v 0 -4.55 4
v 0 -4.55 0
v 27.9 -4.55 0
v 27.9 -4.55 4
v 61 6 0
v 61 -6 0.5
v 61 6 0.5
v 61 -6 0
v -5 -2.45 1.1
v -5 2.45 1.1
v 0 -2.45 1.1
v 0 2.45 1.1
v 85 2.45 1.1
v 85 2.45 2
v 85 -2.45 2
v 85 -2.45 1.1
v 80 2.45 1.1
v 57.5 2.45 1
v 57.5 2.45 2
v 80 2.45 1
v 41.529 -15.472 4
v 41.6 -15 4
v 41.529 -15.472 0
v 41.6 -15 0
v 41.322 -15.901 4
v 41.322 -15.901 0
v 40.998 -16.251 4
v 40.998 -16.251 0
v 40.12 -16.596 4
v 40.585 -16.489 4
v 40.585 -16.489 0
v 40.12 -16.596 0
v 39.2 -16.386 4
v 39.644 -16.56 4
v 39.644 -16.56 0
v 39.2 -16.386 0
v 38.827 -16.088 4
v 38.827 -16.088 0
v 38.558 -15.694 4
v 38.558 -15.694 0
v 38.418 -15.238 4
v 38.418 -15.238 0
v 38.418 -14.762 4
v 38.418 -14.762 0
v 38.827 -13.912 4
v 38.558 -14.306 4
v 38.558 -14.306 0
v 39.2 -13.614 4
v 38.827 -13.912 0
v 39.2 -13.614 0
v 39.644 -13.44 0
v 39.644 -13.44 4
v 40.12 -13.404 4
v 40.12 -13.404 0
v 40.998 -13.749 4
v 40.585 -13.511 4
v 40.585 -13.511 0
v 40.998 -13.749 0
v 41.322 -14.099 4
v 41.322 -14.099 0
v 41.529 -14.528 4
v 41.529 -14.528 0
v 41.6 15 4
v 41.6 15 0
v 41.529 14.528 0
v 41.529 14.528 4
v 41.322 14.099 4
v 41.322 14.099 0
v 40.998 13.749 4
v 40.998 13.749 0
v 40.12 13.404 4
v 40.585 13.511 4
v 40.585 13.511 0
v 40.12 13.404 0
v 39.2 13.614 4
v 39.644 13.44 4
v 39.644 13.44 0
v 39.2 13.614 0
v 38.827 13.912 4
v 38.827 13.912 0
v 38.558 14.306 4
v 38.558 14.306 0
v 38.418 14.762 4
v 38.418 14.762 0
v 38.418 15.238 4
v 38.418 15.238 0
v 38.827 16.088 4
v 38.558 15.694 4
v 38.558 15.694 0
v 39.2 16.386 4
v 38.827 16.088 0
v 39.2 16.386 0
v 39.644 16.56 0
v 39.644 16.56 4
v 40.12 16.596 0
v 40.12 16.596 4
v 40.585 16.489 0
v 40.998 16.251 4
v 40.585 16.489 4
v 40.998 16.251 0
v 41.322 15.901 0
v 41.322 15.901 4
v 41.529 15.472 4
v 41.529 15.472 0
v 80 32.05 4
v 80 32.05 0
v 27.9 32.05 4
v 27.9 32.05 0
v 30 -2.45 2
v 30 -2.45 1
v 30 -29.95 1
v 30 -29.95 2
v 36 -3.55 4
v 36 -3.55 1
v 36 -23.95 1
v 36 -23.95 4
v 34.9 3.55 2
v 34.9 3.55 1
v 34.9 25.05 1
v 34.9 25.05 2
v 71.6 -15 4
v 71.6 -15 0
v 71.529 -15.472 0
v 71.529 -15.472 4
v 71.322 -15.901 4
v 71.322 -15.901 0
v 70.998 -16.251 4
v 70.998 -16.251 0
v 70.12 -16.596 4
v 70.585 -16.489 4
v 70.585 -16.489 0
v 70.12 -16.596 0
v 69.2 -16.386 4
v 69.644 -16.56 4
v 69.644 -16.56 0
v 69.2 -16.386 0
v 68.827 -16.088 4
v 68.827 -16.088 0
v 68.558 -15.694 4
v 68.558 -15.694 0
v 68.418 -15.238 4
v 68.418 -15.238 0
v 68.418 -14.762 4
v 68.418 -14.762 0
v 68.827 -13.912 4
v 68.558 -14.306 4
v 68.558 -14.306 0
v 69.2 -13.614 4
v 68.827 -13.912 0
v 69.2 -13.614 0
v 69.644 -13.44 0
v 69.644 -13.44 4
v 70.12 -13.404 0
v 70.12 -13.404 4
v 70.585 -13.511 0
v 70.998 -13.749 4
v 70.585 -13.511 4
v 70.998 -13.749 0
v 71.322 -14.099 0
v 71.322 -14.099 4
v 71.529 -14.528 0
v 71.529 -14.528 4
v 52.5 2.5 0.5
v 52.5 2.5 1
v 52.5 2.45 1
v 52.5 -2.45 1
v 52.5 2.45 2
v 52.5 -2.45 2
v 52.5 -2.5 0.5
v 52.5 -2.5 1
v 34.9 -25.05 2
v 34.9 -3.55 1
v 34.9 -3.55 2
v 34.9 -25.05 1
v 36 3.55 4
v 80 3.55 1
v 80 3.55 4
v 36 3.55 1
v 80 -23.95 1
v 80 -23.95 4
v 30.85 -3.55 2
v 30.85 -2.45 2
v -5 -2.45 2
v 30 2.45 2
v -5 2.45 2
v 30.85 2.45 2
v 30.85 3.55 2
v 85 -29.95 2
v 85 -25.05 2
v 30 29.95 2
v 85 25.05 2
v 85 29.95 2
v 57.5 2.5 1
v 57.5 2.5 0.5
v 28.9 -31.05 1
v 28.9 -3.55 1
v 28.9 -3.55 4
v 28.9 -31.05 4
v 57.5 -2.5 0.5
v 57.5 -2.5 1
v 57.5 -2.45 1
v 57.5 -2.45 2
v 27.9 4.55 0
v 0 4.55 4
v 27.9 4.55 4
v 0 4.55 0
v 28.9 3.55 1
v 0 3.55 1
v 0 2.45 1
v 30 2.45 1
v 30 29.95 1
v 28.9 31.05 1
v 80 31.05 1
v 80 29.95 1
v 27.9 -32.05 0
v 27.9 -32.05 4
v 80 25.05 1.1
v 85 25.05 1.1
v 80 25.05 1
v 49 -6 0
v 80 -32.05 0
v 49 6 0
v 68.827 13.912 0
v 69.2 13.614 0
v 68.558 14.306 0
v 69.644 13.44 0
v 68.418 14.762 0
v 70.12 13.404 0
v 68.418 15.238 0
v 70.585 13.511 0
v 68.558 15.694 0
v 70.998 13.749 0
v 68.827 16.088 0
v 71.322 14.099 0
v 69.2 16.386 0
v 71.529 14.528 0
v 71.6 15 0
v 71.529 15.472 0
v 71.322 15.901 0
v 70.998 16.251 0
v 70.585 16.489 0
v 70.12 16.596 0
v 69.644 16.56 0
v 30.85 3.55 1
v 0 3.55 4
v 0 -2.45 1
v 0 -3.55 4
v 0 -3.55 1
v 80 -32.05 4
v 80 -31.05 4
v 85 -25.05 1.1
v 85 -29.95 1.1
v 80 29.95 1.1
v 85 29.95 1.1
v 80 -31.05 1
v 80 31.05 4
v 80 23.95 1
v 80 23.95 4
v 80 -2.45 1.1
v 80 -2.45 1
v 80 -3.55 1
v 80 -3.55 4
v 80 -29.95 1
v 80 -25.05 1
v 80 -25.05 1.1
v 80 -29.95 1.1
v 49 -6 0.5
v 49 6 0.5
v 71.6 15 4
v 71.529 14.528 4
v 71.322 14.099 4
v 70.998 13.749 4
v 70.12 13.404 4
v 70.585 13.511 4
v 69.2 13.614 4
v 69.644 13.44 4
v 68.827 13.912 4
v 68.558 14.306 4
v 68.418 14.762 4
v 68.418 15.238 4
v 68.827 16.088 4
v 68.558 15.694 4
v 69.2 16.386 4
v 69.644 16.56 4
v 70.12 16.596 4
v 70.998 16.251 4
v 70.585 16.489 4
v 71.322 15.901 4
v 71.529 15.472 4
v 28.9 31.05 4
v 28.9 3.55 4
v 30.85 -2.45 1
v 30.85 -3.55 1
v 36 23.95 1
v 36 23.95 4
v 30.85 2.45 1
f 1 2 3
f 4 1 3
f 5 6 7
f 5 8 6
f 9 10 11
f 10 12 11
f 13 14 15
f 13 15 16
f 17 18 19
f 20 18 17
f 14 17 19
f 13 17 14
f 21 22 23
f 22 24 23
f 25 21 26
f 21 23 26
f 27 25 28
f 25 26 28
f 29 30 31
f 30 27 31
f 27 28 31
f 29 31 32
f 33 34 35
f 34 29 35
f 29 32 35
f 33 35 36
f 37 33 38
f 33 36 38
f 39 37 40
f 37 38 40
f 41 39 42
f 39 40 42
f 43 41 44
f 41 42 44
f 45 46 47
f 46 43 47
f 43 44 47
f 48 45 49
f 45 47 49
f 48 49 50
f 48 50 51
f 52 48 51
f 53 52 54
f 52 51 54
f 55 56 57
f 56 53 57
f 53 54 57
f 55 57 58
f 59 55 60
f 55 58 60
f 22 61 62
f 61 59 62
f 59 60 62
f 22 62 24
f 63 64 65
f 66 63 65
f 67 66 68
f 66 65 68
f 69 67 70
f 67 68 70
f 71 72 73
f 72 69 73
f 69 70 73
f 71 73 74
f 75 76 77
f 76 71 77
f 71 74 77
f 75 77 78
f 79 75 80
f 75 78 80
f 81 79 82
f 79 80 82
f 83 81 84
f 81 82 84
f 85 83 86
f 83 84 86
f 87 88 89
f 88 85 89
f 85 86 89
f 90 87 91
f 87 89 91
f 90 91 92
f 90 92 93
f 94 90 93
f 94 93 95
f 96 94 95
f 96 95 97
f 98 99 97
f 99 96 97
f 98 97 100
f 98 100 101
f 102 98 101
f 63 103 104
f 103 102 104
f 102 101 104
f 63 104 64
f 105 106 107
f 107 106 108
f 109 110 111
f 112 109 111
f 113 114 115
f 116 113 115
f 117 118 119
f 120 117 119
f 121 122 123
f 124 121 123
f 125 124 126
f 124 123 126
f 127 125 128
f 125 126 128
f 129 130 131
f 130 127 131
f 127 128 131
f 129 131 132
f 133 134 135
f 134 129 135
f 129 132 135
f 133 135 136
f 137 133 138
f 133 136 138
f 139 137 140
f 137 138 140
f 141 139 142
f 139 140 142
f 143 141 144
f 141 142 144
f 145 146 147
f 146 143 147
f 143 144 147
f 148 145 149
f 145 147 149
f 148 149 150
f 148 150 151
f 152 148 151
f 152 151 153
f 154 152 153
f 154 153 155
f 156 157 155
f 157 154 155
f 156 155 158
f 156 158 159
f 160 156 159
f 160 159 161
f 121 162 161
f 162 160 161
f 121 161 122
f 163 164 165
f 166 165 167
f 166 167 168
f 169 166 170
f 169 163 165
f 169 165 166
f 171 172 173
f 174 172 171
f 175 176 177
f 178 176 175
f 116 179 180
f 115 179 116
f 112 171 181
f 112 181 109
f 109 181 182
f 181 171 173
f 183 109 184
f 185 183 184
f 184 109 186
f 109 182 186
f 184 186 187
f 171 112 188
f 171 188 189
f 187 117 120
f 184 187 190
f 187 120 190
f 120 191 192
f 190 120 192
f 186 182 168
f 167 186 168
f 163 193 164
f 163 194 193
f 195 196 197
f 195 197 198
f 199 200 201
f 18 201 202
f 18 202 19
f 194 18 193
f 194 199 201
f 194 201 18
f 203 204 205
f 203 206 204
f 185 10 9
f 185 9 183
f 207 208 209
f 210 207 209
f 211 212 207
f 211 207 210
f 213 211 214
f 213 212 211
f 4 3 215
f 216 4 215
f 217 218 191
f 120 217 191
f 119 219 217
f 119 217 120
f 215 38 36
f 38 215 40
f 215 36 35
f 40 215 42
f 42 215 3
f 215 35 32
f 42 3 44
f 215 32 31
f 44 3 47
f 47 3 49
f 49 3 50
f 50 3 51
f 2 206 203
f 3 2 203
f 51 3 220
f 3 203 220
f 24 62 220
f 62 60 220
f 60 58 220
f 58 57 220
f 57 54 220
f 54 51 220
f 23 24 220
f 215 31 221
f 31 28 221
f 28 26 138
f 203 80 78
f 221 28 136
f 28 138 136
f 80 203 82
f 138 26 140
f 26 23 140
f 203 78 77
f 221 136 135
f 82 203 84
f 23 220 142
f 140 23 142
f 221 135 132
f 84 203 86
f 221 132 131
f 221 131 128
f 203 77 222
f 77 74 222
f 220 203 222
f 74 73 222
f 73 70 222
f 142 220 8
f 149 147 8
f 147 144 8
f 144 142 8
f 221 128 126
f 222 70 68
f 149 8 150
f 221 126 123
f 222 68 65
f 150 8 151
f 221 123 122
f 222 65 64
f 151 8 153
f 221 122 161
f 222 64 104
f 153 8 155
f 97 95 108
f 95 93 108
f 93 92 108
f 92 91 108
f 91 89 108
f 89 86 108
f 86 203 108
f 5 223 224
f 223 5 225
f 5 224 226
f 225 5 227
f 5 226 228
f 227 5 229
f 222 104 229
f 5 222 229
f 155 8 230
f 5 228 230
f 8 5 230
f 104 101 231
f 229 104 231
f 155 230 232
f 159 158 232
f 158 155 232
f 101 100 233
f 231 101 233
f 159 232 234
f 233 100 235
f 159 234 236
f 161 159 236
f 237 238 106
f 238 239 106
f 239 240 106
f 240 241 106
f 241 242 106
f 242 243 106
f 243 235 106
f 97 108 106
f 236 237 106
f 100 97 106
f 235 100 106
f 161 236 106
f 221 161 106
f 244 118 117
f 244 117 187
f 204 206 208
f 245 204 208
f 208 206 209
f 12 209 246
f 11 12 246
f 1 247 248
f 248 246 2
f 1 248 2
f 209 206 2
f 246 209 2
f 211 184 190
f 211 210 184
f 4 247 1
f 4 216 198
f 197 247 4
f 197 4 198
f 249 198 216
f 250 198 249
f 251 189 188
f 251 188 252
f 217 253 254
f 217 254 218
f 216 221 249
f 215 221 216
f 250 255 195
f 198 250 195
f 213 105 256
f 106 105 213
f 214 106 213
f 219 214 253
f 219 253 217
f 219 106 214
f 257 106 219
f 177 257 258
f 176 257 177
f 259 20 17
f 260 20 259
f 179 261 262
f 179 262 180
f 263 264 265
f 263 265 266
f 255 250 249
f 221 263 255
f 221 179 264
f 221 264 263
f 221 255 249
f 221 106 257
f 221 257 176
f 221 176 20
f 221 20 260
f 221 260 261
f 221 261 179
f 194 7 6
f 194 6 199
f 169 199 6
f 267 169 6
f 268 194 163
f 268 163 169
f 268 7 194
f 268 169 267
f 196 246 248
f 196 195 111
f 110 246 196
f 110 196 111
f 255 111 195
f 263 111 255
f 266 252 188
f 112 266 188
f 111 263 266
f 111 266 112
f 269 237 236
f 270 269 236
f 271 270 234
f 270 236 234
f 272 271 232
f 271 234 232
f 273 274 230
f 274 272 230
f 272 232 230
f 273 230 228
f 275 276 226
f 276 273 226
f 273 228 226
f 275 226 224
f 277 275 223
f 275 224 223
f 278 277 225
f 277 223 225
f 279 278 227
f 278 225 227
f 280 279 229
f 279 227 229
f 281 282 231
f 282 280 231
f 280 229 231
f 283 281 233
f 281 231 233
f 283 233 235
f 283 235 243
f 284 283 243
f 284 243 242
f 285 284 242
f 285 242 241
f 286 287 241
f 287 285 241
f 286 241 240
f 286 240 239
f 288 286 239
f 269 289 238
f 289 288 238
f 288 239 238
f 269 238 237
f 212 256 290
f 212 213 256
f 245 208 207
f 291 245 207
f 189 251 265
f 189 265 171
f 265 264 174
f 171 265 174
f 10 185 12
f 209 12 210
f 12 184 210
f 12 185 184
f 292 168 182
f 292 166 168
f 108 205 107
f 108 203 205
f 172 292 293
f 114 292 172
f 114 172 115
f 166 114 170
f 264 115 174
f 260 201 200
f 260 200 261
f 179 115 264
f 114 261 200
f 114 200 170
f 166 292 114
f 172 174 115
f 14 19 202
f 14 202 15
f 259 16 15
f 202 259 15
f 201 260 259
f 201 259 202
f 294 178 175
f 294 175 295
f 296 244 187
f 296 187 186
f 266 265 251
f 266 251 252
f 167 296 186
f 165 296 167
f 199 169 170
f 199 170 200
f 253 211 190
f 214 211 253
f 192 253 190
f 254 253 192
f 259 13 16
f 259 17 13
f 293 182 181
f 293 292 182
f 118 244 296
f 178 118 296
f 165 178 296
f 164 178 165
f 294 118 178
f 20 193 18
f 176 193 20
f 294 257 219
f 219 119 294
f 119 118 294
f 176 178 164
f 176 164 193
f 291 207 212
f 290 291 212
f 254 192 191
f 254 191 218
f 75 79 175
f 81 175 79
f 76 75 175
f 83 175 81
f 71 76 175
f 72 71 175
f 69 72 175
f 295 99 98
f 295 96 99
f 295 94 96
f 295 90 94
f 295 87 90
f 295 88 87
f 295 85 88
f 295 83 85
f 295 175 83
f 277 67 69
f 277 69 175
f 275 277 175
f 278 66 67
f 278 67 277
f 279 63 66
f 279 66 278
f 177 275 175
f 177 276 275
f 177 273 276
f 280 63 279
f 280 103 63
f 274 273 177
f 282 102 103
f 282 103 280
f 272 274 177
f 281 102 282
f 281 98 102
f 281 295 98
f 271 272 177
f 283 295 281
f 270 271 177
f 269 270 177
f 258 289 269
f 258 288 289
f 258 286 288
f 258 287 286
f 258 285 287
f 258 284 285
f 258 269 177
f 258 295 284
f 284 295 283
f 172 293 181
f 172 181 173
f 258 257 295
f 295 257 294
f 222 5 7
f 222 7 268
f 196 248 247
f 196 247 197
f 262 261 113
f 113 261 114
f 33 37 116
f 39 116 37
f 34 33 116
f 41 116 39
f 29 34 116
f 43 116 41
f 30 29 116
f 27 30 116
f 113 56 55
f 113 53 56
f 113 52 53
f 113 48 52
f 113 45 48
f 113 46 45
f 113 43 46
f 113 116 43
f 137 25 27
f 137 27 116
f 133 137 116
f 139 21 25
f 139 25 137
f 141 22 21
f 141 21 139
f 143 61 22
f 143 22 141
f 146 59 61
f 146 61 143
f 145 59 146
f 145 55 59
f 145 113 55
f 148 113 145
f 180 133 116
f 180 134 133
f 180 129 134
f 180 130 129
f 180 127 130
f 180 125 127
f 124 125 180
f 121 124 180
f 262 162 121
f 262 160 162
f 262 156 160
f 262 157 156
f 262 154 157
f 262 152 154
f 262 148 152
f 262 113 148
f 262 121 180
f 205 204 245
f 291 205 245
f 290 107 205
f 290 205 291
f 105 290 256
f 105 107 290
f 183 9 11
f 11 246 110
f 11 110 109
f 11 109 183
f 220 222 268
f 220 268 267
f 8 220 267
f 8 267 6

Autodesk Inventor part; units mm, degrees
ref_plane "YZ Plane" through (0, 0, 0) normal (1, 0, 0) x (0, 1, 0)
ref_plane "XZ Plane" through (0, 0, 0) normal (0, 1, 0) x (-1, 0, 0)
ref_plane "XY Plane" through (0, 0, 0) normal (0, 0, 1) x (1, 0, 0)
sketch "Sketch2" plane through (0, 0, 0) normal (0, 0, 1) x (1, 0, 0)
  line L0 (0, 2.45) -> (0, -2.45)
  line L1 (0, 2.45) -> (30, 2.45)
  line L2 (30, 2.45) -> (30, 29.95)
  line L3 (30, 29.95) -> (80, 29.95)
  line L4 (80, 29.95) -> (80, 25.05)
  line L5 (34.9, 3.55) -> (30.85, 3.55)
  line L6 (30.85, 3.55) -> (30.85, 2.45)
  line L7 (30.85, 2.45) -> (80, 2.45)
  line L8 (80, 2.45) -> (80, -2.45)
  line L9 (80, -2.45) -> (30.85, -2.45)
  line L10 (30.85, -2.45) -> (30.85, -3.55)
  line L11 (30.85, -3.55) -> (34.9, -3.55)
  line L12 (34.9, -3.55) -> (34.9, -25.05)
  line L13 (34.9, 3.55) -> (34.9, 25.05)
  line L14 (80, 25.05) -> (34.9, 25.05)
  line L15 (0, -2.45) -> (30, -2.45)
  line L16 (30, -2.45) -> (30, -29.95)
  line L17 (80, -25.05) -> (80, -29.95)
  line L18 (80, -29.95) -> (30, -29.95)
  line L19 (80, -25.05) -> (34.9, -25.05)
  line L20 (0, 2.45) -> (0, 3.55)
  line L21 (0, 3.55) -> (28.9, 3.55)
  line L22 (28.9, 3.55) -> (28.9, 31.05)
  line L23 (80, 29.95) -> (80, 31.05)
  line L24 (80, 31.05) -> (28.9, 31.05)
  line L25 (80, 25.05) -> (80, 23.95)
  line L26 (80, 23.95) -> (36, 23.95)
  line L27 (80, 2.45) -> (80, 3.55)
  line L28 (80, 3.55) -> (36, 3.55)
  line L29 (36, 3.55) -> (36, 23.95)
  line L30 (0, -2.45) -> (0, -3.55)
  line L31 (0, -3.55) -> (28.9, -3.55)
  line L32 (28.9, -3.55) -> (28.9, -31.05)
  line L33 (80, -2.45) -> (80, -3.55)
  line L34 (80, -3.55) -> (36, -3.55)
  line L35 (36, -3.55) -> (36, -23.95)
  line L36 (80, -25.05) -> (80, -23.95)
  line L37 (80, -23.95) -> (36, -23.95)
  line L38 (80, -29.95) -> (80, -31.05)
  line L39 (80, -31.05) -> (28.9, -31.05)
  line L40 (0, 3.55) -> (0, 4.55)
  line L41 (0, 4.55) -> (27.9, 4.55)
  line L42 (27.9, 4.55) -> (27.9, 32.05)
  line L43 (80, 3.55) -> (80, 4.55)
  line L44 (80, 4.55) -> (37, 4.55)
  line L45 (37, 4.55) -> (37, 22.95)
  line L46 (80, 23.95) -> (80, 22.95)
  line L47 (80, 22.95) -> (37, 22.95)
  line L48 (80, 31.05) -> (80, 32.05)
  line L49 (80, 32.05) -> (27.9, 32.05)
  line L50 (0, -3.55) -> (0, -4.55)
  line L51 (0, -4.55) -> (27.9, -4.55)
  line L52 (27.9, -4.55) -> (27.9, -32.05)
  line L53 (80, -31.05) -> (80, -32.05)
  line L54 (80, -32.05) -> (27.9, -32.05)
  line L55 (80, -23.95) -> (80, -22.95)
  line L56 (80, -22.95) -> (37, -22.95)
  line L57 (80, -3.55) -> (80, -4.55)
  line L58 (80, -4.55) -> (37, -4.55)
  line L59 (37, -4.55) -> (37, -22.95)
  line L60 (80, 22.95) -> (80, 4.55)
  line L61 (80, -4.55) -> (80, -22.95)
  line L62 (40, -15) -> (70, -15) construction
  line L63 (70, -15) -> (70, 15) construction
  line L64 (70, 15) -> (40, 15) construction
  line L65 (40, 15) -> (40, -15) construction
  line L66 (40, -15) -> (70, 15) construction
  line L67 (70, -15) -> (40, 15) construction
  line L68 (55, 0) -> (0, 0) construction
  circle A0 centre (70, 15) radius 1.6
  circle A1 centre (40, 15) radius 1.6
  circle A2 centre (70, -15) radius 1.6
  circle A3 centre (40, -15) radius 1.6
  dimension "d21" = 4.9
  dimension "d23" = 4.9
  dimension "d27" = 30
  dimension "d28" = 4.05
  dimension "d29" = 1.1
  dimension "d31" = 1.1
  dimension "d33" = 1.1
  dimension "d34" = 1.1
  dimension "d35" = 1.1
  dimension "d36" = 1.1
  dimension "d37" = 1.1
  dimension "d38" = 1.1
  dimension "d39" = 1
  dimension "d40" = 1
  dimension "d41" = 1
  dimension "d42" = 1
  dimension "d43" = 1
  dimension "d44" = 1
  dimension "d54" = 30
  dimension "d55" = 30
  dimension "d57" = 3.2
  dimension "d58" = 3.2
  dimension "d59" = 3.2
  dimension "d60" = 3.2
  dimension "d75" = 1.1
  dimension "d76" = 1
  dimension "d77" = 1.1
  dimension "d78" = 1
  dimension "d79" = 4.9
  dimension "d80" = 4.9
  dimension "d81" = 50.1
  dimension "d83" = 55
  dimension "d84" = 80
extrude "Extrusion1" add sketch "Sketch2" along normal blind 2 contours L1 L2 L3 L4 L14 L13 L5 L6 L7 L8 L9 L10 L11 L12 L19 L17 L18 L16 L15 L0
extrude "Extrusion2" add sketch "Sketch2" along normal blind 1 contours L1 L2 L3 L4 L14 L13 L5 L6 L7 L8 L9 L10 L11 L12 L19 L17 L18 L16 L15 L0 | L20 L21 L22 L24 L23 L3 L2 L1 | L15 L16 L18 L38 L39 L32 L31 L30 | L25 L26 L29 L28 L27 L7 L6 L5 L13 L14 | L19 L12 L11 L10 L9 L33 L34 L35 L37 L36
extrude "Extrusion3" add sketch "Sketch2" along normal blind 4 contours L40 L41 L42 L49 L48 L24 L22 L21 | L31 L32 L39 L53 L54 L52 L51 L50 | L46 L47 L45 L44 L43 L28 L29 L26 | L37 L35 L34 L57 L58 L59 L56 L55
extrude "Extrusion4" add sketch "Sketch2" along normal up to surface (4 mm away) contours L60 L44 L45 L47 | L56 L59 L58 L61
sketch "Sketch3" plane through (0, 0, 0) normal (0, 0, -1) x (-1, 0, 0)
  line L0 (-52.5, -2.5) -> (-57.5, -2.5)
  line L1 (-57.5, -2.5) -> (-57.5, 2.5)
  line L2 (-57.5, 2.5) -> (-52.5, 2.5)
  line L3 (-52.5, 2.5) -> (-52.5, -2.5)
  line L4 (-52.5, -2.5) -> (-57.5, 2.5) construction
  line L5 (-57.5, -2.5) -> (-52.5, 2.5) construction
  line L6 (-55, 0) -> (0, 0) construction
  line L7 (-80, -4.55) -> (-80, 4.55) projected
  line L8 (-49, -6) -> (-61, -6)
  line L9 (-61, -6) -> (-61, 6)
  line L10 (-61, 6) -> (-49, 6)
  line L11 (-49, 6) -> (-49, -6)
  line L12 (-49, -6) -> (-61, 6) construction
  line L13 (-61, -6) -> (-49, 6) construction
  dimension "d51" = 5
  dimension "d52" = 5
  dimension "d53" = 25
  dimension "d65" = 12
  dimension "d66" = 12
extrude "Extrusion5" cut sketch "Sketch3" against normal blind 2 contours L0 L1 L2 L3
extrude "Extrusion6" cut sketch "Sketch3" against normal blind 0.5
sketch "Sketch4" plane through (80, -2.45, 2) normal (1, 0, 0) x (0, 0, -1)
  line L0 (0, 27.5) -> (0, 32.4) projected
  line L1 (0, 32.4) -> (0.9, 32.4)
  line L2 (0.9, 32.4) -> (0.9, 27.5)
  line L3 (0.9, 27.5) -> (0, 27.5)
  line L4 (0, 27.5) -> (0, 32.4)
  line L5 (1, 27.5) -> (0, 27.5) projected
  line L6 (0, 0) -> (0, 4.9) projected
  line L7 (0, 4.9) -> (0.9, 4.9)
  line L8 (0.9, 4.9) -> (0.9, 0)
  line L9 (0.9, 0) -> (0, 0)
  line L10 (0, 0) -> (0, 4.9)
  line L11 (0.9, -22.6) -> (0, -22.6)
  line L12 (0.9, -22.6) -> (0.9, -27.5)
  line L13 (0.9, -27.5) -> (0, -27.5)
  line L14 (0, -27.5) -> (0, -22.6)
  line L15 (1, -27.5) -> (0, -27.5) projected
  line L16 (1, 0) -> (0, 0) projected
  line L17 (1, -22.6) -> (0, -22.6) projected
  line L18 (0, -27.5) -> (0, -22.6) projected
  point P0 (2, 2.45)
  dimension "d69" = 0.9
extrude "Extrusion7" add sketch "Sketch4" along normal blind 5
sketch "Sketch5" plane through (0, -2.45, 2) normal (-1, 0, 0) x (0, 0, 1)
  line L0 (0, 4.9) -> (-0.9, 4.9)
  line L1 (-0.9, 4.9) -> (-0.9, 0)
  line L2 (-0.9, 0) -> (0, 0)
  line L3 (0, 0) -> (0, 4.9)
  line L4 (0, 4.9) -> (0, 0) projected
  line L5 (-1, 0) -> (0, 0) projected
  line L6 (-1, 4.9) -> (0, 4.9) projected
  line L7 (-1, 6) -> (-1, 4.9) projected
  point P0 (-2, 2.45)
  dimension "d72" = 0.1
extrude "Extrusion8" add sketch "Sketch5" along normal blind 5
properties part number "bottomv6"
